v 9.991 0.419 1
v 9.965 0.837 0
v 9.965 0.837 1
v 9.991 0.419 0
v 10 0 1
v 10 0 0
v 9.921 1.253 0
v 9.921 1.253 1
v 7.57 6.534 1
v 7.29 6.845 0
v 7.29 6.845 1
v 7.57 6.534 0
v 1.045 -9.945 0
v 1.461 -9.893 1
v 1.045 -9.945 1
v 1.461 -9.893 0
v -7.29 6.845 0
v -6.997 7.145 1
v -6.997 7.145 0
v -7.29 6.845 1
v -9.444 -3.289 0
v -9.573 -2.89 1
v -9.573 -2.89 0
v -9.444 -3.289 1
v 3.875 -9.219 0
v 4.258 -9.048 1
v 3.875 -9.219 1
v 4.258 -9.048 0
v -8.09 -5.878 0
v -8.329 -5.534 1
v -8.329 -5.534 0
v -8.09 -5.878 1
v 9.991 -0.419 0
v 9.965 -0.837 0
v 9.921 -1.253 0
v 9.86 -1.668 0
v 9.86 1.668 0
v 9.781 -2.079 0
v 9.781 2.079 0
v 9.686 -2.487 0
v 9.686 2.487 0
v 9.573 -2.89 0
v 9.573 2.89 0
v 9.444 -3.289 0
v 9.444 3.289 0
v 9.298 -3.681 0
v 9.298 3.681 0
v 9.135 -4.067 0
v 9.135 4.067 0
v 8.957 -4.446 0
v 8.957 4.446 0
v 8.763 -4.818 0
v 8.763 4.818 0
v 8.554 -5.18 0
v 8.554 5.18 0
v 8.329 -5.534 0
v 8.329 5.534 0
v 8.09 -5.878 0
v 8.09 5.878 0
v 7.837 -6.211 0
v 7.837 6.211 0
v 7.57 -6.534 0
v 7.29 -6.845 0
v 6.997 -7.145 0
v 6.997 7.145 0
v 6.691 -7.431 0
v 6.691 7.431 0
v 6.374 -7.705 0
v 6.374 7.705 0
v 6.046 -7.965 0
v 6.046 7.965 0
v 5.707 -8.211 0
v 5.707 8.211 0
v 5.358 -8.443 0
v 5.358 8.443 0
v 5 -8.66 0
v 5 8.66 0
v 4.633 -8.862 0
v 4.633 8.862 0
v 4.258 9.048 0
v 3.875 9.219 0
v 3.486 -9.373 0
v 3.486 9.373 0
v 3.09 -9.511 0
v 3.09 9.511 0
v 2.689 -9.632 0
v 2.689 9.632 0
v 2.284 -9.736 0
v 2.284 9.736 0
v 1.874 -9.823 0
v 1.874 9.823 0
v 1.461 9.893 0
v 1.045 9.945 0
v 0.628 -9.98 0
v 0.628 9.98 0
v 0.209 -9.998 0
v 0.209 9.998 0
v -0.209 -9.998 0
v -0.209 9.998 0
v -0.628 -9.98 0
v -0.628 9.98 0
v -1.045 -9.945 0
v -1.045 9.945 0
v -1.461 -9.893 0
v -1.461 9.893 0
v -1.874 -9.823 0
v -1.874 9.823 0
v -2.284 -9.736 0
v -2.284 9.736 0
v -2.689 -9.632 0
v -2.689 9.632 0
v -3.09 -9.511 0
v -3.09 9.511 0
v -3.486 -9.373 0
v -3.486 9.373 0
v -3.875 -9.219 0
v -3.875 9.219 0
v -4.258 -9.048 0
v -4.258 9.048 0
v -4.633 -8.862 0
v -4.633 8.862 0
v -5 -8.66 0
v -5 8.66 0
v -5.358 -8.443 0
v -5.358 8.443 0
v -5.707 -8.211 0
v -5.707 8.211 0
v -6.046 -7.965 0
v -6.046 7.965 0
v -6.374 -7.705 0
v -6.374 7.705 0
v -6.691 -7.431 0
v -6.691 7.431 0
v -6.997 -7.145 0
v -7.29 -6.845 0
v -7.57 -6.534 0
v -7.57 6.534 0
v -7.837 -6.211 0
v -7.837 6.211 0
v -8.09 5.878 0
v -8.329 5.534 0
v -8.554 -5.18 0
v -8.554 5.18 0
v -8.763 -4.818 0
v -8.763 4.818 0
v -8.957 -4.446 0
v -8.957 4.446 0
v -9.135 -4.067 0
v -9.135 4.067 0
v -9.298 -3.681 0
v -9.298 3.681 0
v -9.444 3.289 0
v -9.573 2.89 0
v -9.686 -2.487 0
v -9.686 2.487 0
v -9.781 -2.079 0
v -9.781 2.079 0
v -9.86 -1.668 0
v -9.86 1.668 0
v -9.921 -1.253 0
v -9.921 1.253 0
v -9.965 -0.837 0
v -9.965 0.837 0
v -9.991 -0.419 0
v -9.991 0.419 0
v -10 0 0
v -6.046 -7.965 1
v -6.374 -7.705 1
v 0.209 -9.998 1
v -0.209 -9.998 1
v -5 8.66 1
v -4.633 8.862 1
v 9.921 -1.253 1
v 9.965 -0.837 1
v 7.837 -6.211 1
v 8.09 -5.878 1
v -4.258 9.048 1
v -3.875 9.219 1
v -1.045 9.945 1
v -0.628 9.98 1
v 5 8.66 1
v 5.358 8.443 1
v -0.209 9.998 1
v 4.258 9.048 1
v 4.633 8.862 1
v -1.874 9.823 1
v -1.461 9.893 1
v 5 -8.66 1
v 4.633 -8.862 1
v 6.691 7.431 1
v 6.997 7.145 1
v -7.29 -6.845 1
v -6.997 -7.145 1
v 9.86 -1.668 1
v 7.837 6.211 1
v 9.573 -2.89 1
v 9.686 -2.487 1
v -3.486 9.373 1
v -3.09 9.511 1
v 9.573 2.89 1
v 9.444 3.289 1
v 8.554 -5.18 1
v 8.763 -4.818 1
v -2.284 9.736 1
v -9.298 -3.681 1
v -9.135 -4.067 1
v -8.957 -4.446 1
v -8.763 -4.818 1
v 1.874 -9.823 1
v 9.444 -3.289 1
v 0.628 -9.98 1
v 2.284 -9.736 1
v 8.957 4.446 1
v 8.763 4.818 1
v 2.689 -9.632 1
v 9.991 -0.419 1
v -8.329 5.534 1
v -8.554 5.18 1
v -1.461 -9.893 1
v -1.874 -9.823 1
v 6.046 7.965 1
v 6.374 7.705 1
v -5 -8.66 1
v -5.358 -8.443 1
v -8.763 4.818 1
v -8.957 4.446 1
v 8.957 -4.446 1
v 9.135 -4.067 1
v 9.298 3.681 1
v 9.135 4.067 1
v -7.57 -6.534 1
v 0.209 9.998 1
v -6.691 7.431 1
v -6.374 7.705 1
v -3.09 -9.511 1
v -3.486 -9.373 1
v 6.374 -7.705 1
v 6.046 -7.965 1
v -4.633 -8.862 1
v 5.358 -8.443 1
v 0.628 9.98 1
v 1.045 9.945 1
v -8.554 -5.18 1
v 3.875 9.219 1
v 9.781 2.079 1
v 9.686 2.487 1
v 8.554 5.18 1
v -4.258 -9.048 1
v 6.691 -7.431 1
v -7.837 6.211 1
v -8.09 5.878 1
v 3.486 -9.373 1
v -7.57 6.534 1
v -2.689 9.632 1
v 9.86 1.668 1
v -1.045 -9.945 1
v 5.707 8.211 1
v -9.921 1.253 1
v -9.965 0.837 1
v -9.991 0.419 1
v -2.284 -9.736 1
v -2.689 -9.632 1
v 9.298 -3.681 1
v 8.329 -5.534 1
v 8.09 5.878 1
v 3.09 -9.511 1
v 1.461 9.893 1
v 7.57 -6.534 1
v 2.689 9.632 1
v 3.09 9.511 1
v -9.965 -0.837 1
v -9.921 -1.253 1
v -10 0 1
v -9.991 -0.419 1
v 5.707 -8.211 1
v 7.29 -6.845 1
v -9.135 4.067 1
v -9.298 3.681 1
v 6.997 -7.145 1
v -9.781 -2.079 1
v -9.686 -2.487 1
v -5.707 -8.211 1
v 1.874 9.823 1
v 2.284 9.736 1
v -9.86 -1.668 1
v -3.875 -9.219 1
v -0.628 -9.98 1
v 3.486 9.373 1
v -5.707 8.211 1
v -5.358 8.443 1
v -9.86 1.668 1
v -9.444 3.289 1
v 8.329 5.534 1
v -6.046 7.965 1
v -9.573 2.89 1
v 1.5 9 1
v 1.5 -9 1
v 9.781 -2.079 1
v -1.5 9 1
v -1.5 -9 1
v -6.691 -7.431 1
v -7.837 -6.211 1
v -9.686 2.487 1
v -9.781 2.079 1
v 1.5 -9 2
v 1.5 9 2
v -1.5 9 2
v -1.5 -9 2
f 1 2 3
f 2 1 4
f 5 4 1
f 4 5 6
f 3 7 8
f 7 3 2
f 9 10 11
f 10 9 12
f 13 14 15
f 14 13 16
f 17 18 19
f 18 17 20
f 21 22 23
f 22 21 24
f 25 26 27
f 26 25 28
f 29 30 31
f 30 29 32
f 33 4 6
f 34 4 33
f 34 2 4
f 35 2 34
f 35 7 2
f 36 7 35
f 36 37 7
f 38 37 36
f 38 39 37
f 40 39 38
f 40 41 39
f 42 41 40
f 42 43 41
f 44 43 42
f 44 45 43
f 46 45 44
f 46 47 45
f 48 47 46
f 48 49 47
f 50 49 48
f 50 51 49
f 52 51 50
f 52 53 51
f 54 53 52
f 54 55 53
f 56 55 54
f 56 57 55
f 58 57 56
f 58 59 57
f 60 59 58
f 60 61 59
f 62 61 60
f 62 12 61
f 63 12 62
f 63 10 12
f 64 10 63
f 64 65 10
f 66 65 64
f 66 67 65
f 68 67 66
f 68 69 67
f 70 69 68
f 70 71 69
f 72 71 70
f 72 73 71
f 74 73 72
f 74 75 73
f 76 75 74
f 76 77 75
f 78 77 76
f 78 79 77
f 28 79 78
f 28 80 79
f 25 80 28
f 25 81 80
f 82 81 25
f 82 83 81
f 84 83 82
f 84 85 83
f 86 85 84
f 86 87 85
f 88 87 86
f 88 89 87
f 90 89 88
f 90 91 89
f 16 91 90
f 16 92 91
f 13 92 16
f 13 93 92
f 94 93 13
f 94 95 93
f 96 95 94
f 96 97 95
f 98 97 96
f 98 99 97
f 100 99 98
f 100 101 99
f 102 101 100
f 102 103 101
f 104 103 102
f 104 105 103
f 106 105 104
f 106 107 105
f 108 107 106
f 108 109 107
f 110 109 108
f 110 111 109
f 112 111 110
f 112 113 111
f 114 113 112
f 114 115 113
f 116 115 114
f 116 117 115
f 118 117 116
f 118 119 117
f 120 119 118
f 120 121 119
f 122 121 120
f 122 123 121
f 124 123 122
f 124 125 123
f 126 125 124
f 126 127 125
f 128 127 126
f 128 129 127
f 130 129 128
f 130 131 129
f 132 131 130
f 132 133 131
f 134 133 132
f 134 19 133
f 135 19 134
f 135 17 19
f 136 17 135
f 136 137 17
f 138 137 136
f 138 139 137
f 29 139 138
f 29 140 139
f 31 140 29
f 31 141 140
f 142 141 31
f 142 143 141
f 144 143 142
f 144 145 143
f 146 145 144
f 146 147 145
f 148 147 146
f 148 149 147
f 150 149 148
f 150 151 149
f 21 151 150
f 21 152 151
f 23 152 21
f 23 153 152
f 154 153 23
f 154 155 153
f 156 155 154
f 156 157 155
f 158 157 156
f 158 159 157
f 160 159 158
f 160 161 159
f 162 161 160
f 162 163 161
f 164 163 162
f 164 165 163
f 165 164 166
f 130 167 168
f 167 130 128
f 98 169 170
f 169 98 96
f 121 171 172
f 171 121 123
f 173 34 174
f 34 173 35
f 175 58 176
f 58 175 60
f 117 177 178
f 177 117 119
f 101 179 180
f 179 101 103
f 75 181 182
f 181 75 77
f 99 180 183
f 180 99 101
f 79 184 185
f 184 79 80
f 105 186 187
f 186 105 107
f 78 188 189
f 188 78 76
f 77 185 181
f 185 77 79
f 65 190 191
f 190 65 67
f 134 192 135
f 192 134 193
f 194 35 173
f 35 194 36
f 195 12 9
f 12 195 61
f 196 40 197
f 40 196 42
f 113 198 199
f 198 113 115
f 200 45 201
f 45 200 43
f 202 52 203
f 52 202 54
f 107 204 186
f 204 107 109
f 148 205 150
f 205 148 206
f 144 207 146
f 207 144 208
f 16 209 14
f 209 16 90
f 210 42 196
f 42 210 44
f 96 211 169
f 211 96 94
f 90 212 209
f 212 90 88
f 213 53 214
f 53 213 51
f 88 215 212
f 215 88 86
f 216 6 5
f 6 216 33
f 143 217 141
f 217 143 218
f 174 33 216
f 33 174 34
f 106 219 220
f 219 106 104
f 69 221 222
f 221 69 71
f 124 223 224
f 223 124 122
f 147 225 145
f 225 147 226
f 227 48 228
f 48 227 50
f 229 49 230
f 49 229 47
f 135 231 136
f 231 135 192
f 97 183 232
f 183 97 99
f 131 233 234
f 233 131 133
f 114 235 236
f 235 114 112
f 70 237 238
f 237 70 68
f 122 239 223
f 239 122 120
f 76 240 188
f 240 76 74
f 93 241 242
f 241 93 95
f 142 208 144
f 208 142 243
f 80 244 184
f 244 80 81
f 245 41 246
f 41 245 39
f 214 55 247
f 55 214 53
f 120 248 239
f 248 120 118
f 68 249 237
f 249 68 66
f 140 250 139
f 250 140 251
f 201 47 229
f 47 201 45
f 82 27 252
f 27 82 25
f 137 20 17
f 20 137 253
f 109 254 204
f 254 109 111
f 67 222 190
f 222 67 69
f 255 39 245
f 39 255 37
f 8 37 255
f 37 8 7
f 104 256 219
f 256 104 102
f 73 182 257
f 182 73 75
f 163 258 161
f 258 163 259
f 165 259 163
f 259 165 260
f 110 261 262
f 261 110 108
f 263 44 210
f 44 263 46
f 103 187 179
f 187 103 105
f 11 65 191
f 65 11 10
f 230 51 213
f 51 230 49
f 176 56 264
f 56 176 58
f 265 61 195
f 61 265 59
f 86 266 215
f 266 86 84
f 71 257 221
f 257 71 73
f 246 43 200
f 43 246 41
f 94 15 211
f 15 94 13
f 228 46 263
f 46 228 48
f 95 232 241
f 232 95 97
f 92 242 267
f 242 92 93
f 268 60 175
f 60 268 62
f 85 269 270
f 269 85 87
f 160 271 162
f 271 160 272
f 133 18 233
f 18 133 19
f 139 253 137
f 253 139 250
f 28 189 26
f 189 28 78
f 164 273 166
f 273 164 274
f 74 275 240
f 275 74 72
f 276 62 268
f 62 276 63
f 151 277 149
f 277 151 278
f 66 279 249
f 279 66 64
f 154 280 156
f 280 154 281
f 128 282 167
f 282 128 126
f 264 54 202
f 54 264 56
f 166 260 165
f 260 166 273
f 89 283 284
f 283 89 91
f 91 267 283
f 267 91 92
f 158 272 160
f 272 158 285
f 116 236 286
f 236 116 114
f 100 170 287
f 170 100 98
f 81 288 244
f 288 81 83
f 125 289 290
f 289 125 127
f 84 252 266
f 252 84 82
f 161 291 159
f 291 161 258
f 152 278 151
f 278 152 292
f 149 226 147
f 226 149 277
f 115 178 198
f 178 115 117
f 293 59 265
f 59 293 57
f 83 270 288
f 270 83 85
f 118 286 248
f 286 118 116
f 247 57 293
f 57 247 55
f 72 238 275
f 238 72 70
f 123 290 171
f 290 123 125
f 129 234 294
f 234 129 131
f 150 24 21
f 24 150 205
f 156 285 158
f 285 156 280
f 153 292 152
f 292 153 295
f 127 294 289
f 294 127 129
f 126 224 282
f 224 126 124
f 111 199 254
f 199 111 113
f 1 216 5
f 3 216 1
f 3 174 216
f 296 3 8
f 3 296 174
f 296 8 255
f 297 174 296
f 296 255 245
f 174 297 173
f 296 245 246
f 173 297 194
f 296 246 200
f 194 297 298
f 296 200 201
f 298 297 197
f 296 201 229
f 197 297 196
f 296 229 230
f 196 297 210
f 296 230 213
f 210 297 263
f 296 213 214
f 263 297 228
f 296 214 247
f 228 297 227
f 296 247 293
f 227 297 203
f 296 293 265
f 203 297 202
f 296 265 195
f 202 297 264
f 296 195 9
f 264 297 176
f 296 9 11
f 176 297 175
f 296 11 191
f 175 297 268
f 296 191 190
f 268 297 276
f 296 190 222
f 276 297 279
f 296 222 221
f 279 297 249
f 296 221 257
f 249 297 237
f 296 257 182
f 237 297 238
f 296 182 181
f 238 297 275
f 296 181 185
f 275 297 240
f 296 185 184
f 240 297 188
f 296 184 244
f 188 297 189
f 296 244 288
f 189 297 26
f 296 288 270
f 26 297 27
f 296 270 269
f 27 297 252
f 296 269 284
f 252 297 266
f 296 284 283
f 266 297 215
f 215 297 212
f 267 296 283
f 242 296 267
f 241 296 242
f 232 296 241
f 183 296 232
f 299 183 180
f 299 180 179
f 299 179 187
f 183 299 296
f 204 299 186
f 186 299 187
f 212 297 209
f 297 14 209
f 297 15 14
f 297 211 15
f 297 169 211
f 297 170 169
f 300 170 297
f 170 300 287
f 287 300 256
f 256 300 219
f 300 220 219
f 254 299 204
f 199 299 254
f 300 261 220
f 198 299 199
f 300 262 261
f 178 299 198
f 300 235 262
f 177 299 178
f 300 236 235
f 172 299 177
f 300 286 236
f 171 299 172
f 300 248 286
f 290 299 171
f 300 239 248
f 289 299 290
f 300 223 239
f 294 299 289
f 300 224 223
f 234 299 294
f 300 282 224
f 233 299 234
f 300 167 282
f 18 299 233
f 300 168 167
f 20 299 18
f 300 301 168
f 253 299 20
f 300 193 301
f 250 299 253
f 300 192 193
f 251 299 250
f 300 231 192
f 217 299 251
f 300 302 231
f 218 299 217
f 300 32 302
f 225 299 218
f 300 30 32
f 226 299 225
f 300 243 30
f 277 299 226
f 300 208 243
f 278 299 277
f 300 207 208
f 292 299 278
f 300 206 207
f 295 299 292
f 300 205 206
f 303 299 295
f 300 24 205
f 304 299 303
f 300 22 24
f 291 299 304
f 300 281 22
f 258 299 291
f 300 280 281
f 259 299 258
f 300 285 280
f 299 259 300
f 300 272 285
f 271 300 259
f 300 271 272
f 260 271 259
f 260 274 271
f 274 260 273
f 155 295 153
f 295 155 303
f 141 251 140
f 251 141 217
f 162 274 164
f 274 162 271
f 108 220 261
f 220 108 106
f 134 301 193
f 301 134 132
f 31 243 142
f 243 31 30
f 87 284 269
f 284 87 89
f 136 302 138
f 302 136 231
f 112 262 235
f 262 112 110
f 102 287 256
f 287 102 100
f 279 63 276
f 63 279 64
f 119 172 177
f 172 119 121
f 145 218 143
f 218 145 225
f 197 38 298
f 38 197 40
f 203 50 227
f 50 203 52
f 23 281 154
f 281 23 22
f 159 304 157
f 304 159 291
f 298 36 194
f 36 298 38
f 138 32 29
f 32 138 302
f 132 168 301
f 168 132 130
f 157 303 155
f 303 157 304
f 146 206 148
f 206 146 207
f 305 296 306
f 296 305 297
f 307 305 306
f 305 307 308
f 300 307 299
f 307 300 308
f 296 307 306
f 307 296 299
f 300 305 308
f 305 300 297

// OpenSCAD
$fn = 150;

union() {
	cylinder(d = 20.0, h = 1.0);
	color(alpha = 1.0, c = "grey") {
		translate(v = [-1.5, -9.0, 1.0]) {
			cube(size = [3, 18.0, 1.0]);
		}
	}
}
